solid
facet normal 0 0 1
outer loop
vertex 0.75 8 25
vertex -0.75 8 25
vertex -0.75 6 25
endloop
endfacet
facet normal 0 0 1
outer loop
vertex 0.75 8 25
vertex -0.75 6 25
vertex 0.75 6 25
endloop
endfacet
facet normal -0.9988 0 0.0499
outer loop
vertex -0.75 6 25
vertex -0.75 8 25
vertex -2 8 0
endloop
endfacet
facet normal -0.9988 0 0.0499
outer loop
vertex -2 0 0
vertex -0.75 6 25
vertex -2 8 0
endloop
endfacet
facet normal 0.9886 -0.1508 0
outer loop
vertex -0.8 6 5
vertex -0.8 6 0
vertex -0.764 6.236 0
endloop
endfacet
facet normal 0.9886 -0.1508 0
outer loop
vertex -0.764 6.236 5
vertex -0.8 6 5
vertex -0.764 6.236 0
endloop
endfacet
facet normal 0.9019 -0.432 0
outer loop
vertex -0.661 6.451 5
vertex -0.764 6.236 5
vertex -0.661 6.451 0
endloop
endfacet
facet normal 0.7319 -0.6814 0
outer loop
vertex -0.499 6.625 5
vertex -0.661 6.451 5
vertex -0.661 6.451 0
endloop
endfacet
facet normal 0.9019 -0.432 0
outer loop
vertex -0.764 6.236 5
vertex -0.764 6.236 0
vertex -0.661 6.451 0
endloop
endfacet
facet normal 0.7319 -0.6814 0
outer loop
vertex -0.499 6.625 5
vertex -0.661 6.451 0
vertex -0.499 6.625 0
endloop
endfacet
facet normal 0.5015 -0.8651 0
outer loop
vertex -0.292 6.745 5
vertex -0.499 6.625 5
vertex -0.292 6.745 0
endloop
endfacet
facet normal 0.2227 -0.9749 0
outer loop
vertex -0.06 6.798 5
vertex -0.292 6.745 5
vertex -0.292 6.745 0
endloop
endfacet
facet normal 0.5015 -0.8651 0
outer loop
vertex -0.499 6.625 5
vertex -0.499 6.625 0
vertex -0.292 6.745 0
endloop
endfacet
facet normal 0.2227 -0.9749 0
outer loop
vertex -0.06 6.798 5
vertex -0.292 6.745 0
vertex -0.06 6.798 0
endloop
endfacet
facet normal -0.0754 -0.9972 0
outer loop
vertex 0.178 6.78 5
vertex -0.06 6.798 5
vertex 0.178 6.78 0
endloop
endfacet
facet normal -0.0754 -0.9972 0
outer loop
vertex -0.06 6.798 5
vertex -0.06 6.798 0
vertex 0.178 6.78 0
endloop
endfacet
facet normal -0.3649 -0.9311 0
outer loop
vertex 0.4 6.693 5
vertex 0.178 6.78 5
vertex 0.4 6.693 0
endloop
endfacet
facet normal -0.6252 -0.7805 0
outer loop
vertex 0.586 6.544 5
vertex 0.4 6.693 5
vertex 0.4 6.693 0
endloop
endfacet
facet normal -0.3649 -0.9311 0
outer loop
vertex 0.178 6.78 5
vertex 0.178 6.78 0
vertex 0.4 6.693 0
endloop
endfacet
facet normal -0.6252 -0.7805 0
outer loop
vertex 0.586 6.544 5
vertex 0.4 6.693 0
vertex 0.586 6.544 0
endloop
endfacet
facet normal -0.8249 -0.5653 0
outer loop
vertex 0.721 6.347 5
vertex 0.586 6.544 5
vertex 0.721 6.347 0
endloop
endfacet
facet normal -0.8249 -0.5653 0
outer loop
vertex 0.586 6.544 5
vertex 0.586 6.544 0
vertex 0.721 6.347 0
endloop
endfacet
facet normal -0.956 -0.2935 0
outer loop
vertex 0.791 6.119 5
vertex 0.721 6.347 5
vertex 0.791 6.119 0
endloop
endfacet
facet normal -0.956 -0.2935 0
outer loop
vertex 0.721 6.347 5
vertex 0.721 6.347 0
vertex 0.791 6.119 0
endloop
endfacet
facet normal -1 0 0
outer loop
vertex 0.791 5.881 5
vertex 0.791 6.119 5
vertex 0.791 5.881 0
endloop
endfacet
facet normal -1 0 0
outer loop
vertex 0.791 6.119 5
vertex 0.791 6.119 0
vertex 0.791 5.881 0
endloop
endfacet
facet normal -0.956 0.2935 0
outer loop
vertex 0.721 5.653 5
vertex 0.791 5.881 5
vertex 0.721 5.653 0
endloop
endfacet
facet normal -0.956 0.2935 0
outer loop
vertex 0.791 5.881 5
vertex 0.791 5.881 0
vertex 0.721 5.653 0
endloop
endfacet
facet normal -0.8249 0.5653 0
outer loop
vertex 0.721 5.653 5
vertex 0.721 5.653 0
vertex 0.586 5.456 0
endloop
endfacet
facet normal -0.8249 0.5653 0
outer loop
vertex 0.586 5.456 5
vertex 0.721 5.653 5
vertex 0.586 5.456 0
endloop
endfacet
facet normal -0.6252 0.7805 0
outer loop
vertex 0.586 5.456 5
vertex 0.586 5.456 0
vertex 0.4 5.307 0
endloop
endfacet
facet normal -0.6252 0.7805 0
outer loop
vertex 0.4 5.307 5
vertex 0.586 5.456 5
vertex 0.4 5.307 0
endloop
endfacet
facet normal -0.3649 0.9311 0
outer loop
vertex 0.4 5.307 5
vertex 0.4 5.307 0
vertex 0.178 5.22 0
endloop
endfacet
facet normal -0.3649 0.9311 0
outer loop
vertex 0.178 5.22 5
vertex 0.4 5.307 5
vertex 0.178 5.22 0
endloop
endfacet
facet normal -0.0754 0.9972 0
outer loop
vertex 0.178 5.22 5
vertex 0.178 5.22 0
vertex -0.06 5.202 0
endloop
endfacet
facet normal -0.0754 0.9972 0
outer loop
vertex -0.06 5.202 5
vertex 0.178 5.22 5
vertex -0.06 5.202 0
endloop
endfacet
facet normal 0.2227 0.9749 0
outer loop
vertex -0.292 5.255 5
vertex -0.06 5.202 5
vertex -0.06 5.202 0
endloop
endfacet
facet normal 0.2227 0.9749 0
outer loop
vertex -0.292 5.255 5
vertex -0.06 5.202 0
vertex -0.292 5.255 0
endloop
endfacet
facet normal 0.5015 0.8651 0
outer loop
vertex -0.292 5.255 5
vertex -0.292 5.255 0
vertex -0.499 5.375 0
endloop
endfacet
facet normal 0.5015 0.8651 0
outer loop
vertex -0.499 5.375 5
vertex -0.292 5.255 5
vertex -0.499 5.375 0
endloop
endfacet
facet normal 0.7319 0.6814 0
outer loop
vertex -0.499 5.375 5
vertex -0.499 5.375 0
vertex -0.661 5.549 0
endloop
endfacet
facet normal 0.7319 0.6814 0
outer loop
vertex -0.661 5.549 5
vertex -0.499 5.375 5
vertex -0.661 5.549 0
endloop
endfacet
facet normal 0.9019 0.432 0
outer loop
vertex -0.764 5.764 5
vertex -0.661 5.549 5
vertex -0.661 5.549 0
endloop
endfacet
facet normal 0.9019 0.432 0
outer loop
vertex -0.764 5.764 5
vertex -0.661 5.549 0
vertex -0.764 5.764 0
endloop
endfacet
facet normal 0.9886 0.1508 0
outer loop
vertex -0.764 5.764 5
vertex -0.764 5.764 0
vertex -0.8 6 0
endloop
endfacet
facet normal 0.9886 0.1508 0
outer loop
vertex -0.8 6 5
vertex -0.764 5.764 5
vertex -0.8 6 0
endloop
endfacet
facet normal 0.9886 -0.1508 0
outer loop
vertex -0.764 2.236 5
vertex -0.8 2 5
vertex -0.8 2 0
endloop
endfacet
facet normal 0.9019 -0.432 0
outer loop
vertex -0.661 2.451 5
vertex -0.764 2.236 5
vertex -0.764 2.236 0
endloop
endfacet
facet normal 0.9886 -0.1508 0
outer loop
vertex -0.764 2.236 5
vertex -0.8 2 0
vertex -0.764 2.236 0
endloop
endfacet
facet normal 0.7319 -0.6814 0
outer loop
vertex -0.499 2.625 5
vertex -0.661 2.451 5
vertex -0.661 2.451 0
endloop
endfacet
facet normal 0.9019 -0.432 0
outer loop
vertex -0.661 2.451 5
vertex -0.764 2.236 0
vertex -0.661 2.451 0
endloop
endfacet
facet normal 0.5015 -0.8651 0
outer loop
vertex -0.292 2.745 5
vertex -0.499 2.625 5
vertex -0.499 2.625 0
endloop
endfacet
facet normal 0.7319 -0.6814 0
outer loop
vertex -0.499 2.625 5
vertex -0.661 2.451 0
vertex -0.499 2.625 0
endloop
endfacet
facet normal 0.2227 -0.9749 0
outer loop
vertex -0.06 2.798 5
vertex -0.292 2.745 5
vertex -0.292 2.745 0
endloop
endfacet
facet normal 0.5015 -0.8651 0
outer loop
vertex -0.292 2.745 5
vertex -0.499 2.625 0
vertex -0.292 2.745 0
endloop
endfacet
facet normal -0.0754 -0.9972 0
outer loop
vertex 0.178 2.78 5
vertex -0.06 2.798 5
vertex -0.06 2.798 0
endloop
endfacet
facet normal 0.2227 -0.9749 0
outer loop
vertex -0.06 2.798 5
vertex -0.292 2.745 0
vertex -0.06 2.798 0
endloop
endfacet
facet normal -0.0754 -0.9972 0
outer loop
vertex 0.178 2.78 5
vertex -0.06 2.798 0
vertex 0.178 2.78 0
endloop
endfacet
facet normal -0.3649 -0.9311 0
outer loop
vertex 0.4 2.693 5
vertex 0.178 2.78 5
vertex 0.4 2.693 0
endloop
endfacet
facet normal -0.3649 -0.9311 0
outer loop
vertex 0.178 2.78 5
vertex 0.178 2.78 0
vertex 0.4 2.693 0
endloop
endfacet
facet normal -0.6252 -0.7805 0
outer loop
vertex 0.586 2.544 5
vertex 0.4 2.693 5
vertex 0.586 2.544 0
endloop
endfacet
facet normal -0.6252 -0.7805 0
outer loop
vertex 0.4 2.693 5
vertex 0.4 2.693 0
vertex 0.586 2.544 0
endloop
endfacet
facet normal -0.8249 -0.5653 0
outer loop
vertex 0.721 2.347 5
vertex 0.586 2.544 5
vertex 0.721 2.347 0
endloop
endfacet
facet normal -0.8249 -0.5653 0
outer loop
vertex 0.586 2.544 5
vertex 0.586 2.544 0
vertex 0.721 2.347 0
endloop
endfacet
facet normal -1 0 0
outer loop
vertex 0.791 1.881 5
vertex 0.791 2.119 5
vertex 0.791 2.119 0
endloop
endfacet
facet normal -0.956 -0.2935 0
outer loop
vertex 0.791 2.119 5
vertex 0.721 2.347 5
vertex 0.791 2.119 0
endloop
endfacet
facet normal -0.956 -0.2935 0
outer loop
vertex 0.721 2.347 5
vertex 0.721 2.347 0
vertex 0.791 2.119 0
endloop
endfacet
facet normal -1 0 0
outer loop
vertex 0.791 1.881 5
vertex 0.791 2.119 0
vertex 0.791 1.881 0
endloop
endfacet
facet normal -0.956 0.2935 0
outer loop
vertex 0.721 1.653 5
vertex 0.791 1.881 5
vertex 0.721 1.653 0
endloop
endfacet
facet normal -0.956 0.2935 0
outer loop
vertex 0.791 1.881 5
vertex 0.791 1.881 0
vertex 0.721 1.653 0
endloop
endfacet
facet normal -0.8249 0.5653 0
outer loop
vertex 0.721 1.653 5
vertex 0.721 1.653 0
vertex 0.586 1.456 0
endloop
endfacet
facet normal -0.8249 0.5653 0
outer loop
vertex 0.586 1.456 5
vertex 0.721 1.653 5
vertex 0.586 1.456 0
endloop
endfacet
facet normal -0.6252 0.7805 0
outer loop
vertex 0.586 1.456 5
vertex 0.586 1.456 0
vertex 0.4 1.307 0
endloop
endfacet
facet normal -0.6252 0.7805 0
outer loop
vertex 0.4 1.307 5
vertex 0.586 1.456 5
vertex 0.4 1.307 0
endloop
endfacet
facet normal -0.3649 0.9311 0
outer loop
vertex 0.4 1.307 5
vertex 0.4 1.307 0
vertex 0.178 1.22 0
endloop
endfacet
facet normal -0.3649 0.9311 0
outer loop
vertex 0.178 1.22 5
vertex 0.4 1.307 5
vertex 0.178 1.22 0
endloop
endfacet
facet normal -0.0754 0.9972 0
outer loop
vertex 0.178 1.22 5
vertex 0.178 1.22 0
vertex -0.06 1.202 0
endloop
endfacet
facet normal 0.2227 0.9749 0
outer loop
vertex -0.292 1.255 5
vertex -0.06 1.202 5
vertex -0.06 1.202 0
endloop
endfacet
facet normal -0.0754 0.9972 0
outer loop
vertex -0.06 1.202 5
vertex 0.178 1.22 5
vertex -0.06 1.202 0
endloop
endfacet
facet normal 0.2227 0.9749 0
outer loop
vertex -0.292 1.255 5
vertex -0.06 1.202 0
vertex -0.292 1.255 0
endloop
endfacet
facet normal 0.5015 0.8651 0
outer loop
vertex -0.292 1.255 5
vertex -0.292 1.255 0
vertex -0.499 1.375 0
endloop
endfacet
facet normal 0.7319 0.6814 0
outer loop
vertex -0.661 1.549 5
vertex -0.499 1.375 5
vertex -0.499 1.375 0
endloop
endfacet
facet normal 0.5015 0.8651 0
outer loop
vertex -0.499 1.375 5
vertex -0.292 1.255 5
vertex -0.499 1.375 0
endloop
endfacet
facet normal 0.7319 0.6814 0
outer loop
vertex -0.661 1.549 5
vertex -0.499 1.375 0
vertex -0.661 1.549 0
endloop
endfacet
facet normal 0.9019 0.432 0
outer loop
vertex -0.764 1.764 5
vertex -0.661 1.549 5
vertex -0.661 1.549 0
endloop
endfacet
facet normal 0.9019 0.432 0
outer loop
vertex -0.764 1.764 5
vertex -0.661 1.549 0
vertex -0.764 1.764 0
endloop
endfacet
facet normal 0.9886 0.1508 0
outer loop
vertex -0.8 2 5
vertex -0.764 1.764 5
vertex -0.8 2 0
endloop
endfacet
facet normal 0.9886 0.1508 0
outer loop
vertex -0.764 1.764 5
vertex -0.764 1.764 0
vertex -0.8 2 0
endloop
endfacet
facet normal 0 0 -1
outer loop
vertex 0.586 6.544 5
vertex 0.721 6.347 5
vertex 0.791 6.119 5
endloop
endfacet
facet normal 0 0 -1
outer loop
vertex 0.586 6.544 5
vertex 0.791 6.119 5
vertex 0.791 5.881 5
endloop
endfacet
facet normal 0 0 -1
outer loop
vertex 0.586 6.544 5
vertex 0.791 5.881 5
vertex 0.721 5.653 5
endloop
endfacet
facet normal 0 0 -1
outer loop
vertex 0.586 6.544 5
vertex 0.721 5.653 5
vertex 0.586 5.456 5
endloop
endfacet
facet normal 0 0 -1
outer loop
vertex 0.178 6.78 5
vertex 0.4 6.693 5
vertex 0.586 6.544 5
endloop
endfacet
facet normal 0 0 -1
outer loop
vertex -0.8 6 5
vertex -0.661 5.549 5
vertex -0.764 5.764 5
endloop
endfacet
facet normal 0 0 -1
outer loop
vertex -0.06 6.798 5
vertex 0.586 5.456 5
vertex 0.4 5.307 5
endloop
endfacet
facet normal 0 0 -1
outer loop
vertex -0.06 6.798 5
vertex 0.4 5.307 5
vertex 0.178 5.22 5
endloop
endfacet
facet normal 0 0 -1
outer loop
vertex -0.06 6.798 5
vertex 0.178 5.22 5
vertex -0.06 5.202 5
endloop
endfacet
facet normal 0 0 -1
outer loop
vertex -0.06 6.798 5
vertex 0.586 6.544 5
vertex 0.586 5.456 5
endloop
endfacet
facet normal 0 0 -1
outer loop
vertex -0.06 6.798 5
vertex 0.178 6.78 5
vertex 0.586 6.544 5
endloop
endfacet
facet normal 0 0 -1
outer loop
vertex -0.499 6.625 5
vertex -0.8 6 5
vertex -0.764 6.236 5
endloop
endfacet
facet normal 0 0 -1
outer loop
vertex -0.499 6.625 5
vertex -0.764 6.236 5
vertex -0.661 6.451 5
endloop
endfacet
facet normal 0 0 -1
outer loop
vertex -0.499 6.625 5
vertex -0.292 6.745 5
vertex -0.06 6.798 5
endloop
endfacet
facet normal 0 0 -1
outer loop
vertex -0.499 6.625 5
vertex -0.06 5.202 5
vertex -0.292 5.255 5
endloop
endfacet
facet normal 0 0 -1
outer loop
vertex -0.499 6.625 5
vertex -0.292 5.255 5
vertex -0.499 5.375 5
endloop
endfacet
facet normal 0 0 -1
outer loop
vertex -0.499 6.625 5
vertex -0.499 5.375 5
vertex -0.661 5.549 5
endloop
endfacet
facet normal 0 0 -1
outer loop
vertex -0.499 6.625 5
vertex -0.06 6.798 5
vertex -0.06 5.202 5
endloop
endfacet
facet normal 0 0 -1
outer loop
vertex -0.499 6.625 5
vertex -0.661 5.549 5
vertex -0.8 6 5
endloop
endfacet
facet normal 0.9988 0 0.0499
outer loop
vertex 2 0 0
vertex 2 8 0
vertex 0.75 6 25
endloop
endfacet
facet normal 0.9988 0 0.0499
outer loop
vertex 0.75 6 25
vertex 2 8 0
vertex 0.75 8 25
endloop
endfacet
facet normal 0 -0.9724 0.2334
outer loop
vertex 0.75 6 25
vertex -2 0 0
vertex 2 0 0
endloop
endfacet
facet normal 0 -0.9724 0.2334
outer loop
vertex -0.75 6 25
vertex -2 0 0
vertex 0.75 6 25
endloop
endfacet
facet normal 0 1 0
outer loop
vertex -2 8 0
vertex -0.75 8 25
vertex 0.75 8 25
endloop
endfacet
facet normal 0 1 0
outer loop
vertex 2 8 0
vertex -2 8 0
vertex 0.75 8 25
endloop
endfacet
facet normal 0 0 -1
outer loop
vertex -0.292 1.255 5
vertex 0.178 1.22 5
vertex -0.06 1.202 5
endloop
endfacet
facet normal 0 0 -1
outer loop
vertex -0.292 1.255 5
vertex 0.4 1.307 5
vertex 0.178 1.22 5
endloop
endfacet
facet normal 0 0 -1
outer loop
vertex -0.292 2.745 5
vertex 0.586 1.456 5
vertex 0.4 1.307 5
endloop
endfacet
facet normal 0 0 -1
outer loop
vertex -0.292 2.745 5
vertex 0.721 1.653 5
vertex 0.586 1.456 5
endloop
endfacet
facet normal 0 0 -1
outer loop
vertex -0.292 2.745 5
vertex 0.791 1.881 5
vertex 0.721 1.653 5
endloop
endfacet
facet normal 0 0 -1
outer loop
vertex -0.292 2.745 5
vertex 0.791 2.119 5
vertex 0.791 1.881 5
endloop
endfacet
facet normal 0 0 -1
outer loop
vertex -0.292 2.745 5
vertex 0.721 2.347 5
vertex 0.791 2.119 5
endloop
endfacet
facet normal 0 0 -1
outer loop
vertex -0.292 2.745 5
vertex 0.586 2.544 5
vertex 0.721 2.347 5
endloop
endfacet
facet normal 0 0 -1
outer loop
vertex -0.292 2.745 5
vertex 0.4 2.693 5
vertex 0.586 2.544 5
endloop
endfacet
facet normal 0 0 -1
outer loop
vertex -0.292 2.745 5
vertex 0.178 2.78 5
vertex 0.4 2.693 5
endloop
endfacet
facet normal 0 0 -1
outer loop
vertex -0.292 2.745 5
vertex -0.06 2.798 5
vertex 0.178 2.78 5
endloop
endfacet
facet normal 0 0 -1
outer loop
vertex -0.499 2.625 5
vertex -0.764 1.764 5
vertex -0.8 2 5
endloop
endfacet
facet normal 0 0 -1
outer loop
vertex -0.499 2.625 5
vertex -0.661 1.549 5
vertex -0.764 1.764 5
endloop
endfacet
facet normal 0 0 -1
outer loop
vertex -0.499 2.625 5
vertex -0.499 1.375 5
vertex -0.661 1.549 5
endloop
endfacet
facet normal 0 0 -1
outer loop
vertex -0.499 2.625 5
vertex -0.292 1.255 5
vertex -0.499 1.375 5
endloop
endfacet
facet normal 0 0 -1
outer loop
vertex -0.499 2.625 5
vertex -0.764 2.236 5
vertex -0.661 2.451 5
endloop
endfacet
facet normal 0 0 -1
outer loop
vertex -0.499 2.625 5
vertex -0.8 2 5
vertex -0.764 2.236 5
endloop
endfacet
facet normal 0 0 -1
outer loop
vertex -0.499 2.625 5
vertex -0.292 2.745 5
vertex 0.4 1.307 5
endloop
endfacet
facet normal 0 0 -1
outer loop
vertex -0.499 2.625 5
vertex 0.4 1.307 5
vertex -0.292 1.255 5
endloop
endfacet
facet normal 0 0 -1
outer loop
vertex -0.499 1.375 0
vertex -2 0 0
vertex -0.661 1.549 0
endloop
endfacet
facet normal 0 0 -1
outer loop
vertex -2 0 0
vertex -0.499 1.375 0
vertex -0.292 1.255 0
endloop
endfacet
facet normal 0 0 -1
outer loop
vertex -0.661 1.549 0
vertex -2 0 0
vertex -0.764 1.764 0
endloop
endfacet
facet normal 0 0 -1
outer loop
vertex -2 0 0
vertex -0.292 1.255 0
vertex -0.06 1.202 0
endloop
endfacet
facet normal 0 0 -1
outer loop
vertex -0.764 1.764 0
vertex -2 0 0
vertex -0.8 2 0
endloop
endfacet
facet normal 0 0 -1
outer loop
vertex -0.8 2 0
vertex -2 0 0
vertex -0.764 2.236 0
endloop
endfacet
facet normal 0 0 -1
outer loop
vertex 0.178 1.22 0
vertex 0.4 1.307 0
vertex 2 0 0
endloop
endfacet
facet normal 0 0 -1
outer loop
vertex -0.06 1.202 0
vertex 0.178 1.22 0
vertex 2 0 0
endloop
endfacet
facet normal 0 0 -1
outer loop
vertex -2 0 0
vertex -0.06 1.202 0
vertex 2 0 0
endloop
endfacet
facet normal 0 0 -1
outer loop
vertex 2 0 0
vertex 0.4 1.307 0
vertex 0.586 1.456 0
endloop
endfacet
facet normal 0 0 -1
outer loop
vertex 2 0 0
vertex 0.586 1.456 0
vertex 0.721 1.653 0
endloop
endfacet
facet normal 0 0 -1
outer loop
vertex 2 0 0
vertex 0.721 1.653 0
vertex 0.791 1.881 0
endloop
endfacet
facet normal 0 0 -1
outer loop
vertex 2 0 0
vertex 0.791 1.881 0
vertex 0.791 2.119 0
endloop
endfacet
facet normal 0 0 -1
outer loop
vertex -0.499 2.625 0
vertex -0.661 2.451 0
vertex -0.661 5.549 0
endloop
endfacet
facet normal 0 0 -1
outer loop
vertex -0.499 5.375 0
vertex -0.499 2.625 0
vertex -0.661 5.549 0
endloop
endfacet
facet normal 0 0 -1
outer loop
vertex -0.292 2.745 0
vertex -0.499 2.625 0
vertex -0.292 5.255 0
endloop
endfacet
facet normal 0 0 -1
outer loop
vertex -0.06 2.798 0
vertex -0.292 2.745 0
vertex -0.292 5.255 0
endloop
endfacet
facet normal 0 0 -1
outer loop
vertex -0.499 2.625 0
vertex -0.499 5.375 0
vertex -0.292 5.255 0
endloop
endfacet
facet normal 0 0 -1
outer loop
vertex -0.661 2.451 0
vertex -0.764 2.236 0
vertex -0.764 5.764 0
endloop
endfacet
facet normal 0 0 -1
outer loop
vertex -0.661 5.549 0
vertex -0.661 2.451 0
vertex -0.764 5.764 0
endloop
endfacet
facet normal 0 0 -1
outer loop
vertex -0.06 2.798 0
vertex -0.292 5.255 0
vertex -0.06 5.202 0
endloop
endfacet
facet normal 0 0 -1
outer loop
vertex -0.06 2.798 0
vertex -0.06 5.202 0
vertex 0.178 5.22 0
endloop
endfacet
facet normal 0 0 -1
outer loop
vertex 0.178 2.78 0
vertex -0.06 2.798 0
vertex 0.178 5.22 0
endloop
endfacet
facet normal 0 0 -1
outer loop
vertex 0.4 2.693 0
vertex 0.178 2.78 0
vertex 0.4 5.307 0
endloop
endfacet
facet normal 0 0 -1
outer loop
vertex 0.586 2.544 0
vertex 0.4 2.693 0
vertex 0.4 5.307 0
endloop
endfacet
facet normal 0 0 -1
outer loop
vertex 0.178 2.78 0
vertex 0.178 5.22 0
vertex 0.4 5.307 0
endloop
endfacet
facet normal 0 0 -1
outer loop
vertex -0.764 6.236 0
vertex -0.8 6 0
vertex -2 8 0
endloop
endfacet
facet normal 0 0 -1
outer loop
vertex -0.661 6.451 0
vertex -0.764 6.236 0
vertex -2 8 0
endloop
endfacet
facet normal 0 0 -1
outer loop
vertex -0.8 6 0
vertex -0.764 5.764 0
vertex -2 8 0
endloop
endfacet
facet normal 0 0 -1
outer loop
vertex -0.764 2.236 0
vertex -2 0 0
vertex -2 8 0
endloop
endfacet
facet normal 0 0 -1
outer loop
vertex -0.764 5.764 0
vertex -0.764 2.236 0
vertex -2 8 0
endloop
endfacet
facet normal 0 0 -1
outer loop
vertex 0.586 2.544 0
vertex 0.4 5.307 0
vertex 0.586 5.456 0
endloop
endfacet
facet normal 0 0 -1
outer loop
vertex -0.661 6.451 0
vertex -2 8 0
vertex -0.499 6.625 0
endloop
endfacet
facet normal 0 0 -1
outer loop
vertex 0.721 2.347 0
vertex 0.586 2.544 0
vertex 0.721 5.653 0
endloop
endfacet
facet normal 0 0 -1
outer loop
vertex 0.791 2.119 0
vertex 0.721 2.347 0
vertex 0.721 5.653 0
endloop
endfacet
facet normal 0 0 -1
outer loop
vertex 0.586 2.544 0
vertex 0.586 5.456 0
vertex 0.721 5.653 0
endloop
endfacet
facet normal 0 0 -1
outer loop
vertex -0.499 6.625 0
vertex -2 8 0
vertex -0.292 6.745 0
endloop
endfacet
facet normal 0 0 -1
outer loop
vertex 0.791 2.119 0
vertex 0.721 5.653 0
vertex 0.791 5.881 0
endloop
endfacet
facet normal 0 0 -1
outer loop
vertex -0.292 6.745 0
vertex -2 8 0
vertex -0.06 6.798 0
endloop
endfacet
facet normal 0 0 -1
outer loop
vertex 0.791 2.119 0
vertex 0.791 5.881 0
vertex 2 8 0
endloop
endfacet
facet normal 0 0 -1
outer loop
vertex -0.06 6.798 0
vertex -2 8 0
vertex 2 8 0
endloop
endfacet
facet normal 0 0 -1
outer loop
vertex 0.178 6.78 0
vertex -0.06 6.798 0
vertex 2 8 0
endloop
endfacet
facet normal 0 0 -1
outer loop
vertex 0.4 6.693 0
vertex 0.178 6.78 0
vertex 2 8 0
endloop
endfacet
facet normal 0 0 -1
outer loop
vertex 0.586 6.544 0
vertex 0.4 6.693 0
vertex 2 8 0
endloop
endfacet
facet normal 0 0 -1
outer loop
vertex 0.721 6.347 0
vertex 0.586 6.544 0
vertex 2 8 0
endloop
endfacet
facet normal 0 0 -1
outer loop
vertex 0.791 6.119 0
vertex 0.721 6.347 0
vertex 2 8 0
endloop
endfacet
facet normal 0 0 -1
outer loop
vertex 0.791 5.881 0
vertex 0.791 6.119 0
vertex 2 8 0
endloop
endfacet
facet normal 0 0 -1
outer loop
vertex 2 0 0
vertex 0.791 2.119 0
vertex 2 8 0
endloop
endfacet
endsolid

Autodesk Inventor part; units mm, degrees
ref_plane "YZ Plane" through (0, 0, 0) normal (1, 0, 0) x (0, 1, 0)
ref_plane "XZ Plane" through (0, 0, 0) normal (0, 1, 0) x (-1, 0, 0)
ref_plane "XY Plane" through (0, 0, 0) normal (0, 0, 1) x (1, 0, 0)
sketch "スケッチ1" plane through (0, 0, 0) normal (0, 0, 1) x (1, 0, 0)
  line L0 (-2, 8) -> (2, 8)
  line L1 (2, 8) -> (2, 0)
  line L2 (2, 0) -> (-2, 0)
  line L3 (-2, 0) -> (-2, 8)
  point P0 (0, 0)
  point P1 (0, 0)
  dimension "d0" = 8
  dimension "d1" = 4
extrude "押し出し1" add sketch "スケッチ1" along normal blind 25
sketch "スケッチ2" plane through (-2, 0, 0) normal (-1, 0, 0) x (0, 0, 1)
  line L0 (0, 0) -> (25, 6)
  line L1 (25, 0) -> (25, 8) projected
  line L2 (0, 8) -> (25, 8) projected
  line L3 (25, 8) -> (0, 8)
  line L4 (0, 8) -> (0, 0)
  line L5 (0, 8) -> (0, 0) projected
  line L6 (0, 0) -> (25, 0) projected
  line L7 (25, 8) -> (25, 0) projected
  line L8 (0, 8) -> (25, 8) projected
  point P0 (0, 0)
  dimension "d4" = 2
extrude "押し出し2" cut sketch "スケッチ2" against normal through all contours L0 L1 L6
sketch "スケッチ3" plane through (-2, 8, 0) normal (0, 1, 0) x (1, 0, 0)
  line L0 (4, 0) -> (4, -25) projected
  line L1 (4, 0) -> (2.75, -25)
  line L2 (2.75, -25) -> (1.25, -25)
  line L3 (1.25, -25) -> (0, 0)
  line L4 (4, 0) -> (0, 0) projected
  line L5 (4, -25) -> (0, -25) projected
  line L6 (4, 0) -> (0, 0) projected
  line L7 (0, 0) -> (0, -25) projected
  line L8 (4, -25) -> (0, -25) projected
  line L9 (4, 0) -> (4, -25) projected
  point P0 (2, 0)
  point P1 (2, -25)
  point P2 (2, 0)
  dimension "d7" = 1.5
extrude "押し出し3" cut sketch "スケッチ3" against normal through all contours L0 L5 L1 | L3 L5 L7
sketch "スケッチ4" plane through (0, 0, 0) normal (0, 0, -1) x (-1, 0, 0)
  circle A0 centre (0, 6) radius 0.8
  circle A1 centre (0, 2) radius 0.8
  line L0 (-2, 8) -> (2, 8) projected
  line L1 (2, 0) -> (-2, 0) projected
  point P0 (0, 0)
  point P1 (0, 8)
  dimension "d10" = 1.6
  dimension "d11" = 1.6
  dimension "d12" = 2
  dimension "d13" = 2
  dimension "d16" = 4
extrude "押し出し4" cut sketch "スケッチ4" against normal blind 5
properties part number "amtana"
